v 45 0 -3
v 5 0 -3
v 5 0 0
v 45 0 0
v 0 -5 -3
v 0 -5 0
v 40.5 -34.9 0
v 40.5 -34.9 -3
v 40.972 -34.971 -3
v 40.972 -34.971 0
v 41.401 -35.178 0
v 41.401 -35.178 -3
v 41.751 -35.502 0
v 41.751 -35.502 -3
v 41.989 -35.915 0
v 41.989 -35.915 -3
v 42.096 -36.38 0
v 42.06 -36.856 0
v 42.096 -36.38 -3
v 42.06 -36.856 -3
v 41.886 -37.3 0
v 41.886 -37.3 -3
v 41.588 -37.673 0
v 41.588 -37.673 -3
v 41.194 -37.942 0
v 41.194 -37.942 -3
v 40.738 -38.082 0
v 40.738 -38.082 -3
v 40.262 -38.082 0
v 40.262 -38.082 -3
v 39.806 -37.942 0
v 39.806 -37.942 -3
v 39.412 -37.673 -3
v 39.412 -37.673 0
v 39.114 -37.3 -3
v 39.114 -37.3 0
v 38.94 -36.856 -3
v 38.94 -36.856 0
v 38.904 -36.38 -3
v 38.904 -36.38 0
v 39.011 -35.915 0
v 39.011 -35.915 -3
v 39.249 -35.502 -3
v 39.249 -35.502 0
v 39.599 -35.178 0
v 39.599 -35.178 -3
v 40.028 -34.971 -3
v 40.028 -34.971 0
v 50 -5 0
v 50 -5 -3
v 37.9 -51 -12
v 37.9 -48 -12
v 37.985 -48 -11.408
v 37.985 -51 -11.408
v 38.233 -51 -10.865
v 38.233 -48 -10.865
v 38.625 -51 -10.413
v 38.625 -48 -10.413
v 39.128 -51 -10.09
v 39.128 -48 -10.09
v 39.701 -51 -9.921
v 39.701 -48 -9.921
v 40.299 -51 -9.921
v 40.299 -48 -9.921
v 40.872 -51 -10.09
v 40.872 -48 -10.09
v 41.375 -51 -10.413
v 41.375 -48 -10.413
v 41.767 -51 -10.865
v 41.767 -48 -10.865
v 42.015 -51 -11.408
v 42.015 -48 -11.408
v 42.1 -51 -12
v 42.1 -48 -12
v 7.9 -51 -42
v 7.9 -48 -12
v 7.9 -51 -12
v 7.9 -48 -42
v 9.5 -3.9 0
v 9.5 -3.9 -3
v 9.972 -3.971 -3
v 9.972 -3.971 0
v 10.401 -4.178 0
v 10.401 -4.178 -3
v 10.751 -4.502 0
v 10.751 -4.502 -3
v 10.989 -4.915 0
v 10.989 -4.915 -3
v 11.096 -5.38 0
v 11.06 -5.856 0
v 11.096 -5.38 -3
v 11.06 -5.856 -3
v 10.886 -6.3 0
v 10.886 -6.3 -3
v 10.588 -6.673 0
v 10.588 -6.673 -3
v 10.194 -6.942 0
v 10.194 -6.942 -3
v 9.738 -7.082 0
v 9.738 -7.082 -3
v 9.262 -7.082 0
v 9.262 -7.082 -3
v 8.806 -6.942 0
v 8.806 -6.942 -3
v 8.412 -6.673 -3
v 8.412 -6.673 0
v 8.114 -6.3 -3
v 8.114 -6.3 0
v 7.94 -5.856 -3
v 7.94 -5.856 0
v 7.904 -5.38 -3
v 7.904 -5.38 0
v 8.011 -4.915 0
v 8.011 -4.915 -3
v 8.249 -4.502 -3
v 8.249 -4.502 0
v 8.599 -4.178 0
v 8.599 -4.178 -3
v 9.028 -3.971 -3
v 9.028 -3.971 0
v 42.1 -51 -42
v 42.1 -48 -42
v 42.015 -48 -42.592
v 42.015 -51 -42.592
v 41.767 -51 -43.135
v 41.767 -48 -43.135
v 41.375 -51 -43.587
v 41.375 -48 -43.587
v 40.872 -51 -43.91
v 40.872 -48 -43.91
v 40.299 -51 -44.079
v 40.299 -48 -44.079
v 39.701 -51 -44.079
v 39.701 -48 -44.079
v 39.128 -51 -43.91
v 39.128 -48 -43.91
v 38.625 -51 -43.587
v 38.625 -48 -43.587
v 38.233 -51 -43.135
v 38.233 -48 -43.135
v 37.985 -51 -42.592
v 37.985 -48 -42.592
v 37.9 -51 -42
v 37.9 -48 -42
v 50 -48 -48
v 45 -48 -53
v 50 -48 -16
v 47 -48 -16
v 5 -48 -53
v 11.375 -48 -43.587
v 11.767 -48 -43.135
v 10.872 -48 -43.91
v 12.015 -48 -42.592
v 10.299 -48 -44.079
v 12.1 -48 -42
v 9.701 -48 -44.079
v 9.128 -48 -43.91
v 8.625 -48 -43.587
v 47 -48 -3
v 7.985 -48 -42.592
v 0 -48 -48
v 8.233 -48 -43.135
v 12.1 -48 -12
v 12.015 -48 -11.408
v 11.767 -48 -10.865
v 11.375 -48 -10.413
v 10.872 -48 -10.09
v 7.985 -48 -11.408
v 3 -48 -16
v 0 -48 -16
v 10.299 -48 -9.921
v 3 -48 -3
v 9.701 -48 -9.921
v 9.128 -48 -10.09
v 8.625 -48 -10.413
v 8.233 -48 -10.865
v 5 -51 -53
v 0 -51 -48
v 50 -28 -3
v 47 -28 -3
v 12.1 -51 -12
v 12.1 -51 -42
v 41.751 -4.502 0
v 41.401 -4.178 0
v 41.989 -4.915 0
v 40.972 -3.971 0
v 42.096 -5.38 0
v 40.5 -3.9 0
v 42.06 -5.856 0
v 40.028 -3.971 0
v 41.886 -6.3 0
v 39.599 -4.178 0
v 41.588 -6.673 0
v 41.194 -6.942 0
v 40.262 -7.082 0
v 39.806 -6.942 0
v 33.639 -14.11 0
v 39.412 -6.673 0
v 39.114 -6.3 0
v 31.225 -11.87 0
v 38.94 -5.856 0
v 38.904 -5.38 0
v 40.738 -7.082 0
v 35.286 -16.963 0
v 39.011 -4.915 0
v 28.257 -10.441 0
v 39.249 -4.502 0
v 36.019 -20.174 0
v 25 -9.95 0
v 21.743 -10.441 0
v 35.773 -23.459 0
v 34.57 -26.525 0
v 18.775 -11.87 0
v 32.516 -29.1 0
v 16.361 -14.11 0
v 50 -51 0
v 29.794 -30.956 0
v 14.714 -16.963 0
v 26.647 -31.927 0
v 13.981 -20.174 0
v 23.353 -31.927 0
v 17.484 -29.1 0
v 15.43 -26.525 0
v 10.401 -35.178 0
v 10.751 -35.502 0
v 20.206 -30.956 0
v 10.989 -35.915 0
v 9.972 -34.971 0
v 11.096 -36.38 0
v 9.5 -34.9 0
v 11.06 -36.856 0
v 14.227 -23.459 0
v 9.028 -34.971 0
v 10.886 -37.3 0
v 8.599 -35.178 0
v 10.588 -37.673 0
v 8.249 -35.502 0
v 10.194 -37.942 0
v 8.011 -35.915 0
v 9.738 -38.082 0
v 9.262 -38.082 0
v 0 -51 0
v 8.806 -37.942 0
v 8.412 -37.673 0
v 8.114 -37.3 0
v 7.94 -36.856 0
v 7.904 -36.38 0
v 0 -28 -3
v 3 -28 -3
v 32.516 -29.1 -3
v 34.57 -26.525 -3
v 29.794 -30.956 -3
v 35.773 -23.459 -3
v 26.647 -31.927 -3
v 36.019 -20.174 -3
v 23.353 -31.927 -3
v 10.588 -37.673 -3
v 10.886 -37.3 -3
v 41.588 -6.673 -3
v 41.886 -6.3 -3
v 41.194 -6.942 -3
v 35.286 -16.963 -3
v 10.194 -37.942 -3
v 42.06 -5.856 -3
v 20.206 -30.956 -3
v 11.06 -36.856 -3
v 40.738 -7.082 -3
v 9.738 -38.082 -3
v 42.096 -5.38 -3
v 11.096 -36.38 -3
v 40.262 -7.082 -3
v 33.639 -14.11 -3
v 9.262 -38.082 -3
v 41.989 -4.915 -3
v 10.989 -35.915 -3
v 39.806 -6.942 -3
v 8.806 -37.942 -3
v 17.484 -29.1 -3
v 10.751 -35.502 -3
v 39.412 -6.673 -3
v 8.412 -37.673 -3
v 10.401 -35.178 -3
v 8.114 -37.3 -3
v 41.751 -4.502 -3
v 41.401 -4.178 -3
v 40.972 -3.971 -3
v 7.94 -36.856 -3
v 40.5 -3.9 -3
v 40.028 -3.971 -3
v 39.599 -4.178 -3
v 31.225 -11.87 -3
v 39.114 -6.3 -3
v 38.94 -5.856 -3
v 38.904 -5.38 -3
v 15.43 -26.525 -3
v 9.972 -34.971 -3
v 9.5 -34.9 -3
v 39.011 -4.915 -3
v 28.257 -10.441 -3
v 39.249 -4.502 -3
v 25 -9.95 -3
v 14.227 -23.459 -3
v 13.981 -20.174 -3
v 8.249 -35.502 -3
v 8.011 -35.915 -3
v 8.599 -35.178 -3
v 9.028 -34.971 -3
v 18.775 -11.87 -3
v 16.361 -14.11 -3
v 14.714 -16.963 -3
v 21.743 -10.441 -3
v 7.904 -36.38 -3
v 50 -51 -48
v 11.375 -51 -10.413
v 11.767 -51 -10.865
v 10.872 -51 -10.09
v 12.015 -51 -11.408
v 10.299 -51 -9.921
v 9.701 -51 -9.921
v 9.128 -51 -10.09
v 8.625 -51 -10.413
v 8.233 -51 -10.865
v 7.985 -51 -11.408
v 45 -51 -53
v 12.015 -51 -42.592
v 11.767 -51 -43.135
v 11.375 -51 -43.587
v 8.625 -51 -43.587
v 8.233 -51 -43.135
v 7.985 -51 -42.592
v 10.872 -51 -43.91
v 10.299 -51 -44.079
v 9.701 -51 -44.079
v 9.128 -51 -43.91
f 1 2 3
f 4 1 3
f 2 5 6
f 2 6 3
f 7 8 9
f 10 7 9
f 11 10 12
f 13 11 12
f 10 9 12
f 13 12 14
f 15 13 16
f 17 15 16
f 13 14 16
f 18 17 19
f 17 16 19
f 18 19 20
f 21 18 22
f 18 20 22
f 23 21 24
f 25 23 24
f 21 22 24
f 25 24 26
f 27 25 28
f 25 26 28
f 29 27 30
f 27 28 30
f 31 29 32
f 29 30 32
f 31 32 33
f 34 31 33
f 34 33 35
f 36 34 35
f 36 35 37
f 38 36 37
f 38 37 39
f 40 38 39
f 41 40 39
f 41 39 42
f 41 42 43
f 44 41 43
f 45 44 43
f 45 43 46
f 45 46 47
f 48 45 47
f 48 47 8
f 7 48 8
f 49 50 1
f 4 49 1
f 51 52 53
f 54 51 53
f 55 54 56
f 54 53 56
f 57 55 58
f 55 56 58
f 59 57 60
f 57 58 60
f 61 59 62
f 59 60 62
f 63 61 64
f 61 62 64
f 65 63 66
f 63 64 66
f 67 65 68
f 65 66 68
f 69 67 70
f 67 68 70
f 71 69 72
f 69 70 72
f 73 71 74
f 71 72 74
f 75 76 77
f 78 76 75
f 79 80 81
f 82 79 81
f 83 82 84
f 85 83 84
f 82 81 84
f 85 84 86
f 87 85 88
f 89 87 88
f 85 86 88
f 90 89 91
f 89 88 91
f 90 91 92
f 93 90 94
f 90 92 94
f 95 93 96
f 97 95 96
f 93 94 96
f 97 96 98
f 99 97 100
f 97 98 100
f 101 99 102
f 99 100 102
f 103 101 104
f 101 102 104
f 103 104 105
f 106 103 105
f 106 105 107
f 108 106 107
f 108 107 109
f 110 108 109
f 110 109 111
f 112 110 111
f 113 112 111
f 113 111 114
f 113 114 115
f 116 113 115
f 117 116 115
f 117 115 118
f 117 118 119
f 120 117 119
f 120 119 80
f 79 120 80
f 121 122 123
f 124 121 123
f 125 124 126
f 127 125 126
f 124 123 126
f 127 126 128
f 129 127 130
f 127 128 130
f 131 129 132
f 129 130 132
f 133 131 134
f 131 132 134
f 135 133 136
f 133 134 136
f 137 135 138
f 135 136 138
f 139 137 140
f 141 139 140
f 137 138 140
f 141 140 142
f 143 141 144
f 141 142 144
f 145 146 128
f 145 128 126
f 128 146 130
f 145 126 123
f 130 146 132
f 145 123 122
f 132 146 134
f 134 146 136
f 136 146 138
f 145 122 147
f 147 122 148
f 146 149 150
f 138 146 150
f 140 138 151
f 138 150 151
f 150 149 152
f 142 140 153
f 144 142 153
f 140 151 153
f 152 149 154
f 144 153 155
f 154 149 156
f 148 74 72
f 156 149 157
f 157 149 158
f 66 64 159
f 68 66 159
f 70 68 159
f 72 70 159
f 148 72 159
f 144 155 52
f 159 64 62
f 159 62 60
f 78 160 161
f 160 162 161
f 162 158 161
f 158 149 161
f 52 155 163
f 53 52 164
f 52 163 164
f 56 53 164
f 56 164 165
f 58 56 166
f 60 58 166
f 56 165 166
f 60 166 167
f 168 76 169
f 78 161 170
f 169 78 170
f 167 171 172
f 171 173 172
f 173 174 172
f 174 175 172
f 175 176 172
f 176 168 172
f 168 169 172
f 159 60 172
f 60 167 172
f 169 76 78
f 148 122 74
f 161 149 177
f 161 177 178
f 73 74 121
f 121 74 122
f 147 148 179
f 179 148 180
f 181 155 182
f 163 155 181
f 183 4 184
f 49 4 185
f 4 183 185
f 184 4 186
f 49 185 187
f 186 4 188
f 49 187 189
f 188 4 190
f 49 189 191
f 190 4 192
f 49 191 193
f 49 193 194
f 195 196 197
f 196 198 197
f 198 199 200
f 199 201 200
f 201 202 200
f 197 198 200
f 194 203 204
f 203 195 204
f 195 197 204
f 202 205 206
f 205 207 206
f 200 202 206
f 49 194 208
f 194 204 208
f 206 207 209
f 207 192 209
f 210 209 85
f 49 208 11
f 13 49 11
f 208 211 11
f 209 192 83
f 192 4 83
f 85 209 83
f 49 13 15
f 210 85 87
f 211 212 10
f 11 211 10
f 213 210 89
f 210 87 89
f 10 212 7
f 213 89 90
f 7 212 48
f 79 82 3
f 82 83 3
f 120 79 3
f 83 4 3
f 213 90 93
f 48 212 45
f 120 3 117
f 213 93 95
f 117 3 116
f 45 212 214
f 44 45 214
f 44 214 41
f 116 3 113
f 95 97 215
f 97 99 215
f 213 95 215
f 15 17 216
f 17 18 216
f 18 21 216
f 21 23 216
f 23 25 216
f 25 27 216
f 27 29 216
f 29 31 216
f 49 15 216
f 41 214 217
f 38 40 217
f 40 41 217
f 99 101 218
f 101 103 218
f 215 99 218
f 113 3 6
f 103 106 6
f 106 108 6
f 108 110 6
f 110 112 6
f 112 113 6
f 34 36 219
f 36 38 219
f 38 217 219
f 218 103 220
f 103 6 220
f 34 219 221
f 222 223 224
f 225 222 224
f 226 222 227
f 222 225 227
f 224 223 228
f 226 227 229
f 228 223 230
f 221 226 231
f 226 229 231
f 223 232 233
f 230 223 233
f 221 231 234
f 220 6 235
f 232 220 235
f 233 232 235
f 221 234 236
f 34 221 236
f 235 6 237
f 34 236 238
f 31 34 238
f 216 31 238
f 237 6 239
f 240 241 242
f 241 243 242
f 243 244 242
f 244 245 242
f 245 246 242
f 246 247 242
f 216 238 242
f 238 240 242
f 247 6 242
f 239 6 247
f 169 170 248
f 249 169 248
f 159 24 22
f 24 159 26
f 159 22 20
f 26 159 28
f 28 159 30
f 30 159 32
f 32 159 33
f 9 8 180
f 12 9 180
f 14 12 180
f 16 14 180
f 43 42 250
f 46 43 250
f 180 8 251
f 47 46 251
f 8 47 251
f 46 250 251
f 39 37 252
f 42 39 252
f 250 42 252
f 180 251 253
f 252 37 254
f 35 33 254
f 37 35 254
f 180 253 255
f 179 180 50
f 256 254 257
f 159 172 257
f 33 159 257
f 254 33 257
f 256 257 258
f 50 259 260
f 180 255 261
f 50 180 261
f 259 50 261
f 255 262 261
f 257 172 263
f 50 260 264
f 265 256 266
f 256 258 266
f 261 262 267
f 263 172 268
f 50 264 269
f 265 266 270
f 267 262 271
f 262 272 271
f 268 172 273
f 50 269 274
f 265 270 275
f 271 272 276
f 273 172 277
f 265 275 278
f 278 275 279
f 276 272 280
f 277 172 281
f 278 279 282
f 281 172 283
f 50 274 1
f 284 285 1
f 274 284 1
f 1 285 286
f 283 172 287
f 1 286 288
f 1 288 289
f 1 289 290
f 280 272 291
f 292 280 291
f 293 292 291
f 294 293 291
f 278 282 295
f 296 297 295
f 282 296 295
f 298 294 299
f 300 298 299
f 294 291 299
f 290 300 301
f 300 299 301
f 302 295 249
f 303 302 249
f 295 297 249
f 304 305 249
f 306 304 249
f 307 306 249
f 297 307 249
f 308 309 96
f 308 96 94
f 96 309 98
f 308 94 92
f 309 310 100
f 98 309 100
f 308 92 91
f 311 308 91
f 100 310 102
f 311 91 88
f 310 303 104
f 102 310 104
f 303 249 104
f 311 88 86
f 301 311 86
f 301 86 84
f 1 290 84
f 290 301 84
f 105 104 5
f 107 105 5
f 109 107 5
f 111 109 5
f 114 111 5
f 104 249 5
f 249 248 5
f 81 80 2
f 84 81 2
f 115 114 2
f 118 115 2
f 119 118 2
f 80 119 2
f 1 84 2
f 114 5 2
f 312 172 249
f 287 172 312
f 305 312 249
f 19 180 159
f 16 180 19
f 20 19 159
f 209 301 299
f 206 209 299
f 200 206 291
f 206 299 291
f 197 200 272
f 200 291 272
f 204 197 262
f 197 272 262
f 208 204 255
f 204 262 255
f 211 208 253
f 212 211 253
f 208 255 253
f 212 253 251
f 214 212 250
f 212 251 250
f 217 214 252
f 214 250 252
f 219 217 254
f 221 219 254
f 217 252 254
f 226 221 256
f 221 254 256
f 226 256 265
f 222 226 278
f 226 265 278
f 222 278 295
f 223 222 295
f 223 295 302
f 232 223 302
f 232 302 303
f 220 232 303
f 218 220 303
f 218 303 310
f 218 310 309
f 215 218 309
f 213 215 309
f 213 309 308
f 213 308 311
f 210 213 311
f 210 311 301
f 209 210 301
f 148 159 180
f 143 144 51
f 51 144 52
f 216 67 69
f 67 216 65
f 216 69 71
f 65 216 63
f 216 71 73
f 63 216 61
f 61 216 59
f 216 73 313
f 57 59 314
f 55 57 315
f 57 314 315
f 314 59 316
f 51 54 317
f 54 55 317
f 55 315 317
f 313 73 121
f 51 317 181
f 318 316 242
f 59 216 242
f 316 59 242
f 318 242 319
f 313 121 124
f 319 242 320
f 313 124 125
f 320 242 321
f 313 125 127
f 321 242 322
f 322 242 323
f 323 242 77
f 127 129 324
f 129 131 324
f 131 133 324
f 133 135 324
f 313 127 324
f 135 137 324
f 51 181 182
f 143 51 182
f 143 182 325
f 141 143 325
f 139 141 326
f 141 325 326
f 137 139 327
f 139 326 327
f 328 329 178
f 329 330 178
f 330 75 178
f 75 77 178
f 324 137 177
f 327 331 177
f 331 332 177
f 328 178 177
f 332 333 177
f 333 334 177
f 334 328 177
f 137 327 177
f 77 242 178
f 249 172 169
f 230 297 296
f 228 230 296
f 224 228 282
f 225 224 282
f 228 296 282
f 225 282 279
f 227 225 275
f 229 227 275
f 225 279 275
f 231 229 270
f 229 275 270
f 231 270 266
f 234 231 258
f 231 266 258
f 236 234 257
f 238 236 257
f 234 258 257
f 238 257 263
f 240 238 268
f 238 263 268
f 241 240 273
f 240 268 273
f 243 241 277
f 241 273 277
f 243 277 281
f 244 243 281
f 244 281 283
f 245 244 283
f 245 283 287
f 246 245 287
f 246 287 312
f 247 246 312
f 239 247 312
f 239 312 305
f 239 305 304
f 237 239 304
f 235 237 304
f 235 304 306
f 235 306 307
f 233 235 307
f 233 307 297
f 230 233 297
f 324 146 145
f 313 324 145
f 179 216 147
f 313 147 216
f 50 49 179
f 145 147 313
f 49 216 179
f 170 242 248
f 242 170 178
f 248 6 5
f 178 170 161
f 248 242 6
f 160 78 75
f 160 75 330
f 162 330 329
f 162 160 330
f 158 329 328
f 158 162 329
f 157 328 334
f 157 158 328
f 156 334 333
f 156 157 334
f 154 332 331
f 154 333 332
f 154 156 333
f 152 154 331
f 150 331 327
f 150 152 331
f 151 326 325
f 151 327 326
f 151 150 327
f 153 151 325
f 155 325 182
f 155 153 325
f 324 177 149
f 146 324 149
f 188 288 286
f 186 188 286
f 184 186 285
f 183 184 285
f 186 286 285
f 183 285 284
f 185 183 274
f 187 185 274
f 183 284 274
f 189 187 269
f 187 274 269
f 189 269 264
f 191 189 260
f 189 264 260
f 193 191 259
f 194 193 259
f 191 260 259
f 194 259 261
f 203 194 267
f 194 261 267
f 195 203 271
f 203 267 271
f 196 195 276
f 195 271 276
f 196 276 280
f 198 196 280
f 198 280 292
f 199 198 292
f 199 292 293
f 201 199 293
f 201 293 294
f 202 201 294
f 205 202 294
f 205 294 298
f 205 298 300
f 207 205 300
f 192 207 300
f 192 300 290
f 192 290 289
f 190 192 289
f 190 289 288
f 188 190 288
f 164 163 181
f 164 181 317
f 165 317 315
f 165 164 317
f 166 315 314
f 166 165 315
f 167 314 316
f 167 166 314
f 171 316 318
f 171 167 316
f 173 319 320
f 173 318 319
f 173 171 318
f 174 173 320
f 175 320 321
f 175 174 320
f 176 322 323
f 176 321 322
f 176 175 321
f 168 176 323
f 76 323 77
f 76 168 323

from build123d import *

# Parameters (mm, degrees)
EXTRUDE_1_DEPTH     = 50
SKETCH_4_W          = 44
SKETCH_4_H          = 13
CUT_EXTRUDE_2_DEPTH = 20
CUT_EXTRUDE_3_DEPTH = 88.252507127
SKETCH_6_R          = 11.05
SKETCH_6_R_2        = 1.6
CUT_EXTRUDE_4_DEPTH = 88.183714076


with BuildPart() as part:
    # 草图1 → 凸台-拉伸1 (new body)
    with BuildSketch(Plane(origin=(0, 0, 0), x_dir=(0, 0, -1), z_dir=(1, 0, 0))):
        Polygon((3, 0), (0, 0), (0, -51), (53, -51), (53, -48), (16, -48), (3, -28), align=None)
    extrude(amount=EXTRUDE_1_DEPTH)

    # 草图4 → 切除-拉伸2 (cut)
    with BuildSketch(Plane(origin=(0, -48, 0), x_dir=(1, 0, 0), z_dir=(0, 1, 0))):
        with Locations((25, 9.5)):
            Rectangle(SKETCH_4_W, SKETCH_4_H)
    extrude(amount=CUT_EXTRUDE_2_DEPTH, mode=Mode.SUBTRACT)

    # 草图5 → 切除-拉伸3 (cut, through all)
    with BuildSketch(Plane(origin=(0, -48, 0), x_dir=(1, 0, 0), z_dir=(0, 1, 0))):
        with BuildLine():
            Line((12.1, 42), (12.1, 12))
            ThreePointArc((12.1, 12), (10, 9.9), (7.9, 12))
            Line((7.9, 12), (7.9, 42))
            ThreePointArc((7.9, 42), (10, 44.1), (12.1, 42))
        make_face()
        with BuildLine():
            Line((37.9, 42), (37.9, 12))
            ThreePointArc((37.9, 12), (40, 9.9), (42.1, 12))
            Line((42.1, 12), (42.1, 42))
            ThreePointArc((42.1, 42), (40, 44.1), (37.9, 42))
        make_face()
        Polygon((50, 53), (45, 53), (50, 48), align=None)
        Polygon((5, 53), (0, 48), (0, 53), align=None)
    extrude(amount=-CUT_EXTRUDE_3_DEPTH, mode=Mode.SUBTRACT)

    # 草图6 → 切除-拉伸4 (cut, through all)
    with BuildSketch(Plane(origin=(0, 0, -3), x_dir=(-1, 0, 0), z_dir=(0, 0, -1))):
        with Locations(Location((-25, -21, 0), (0, 0, 90))):
            Circle(SKETCH_6_R)
        with Locations(Location((-40.5, -5.5, 0), (0, 0, 90))):
            Circle(SKETCH_6_R_2)
        with Locations(Location((-9.5, -5.5, 0), (0, 0, 90))):
            Circle(SKETCH_6_R_2)
        with Locations(Location((-9.5, -36.5, 0), (0, 0, 90))):
            Circle(SKETCH_6_R_2)
        with Locations(Location((-40.5, -36.5, 0), (0, 0, 90))):
            Circle(SKETCH_6_R_2)
        Polygon((-50, 0), (-50, -5), (-45, 0), align=None)
        Polygon((0, -5), (-5, 0), (0, 0), align=None)
    extrude(amount=-CUT_EXTRUDE_4_DEPTH, mode=Mode.SUBTRACT)


solid = part.part
